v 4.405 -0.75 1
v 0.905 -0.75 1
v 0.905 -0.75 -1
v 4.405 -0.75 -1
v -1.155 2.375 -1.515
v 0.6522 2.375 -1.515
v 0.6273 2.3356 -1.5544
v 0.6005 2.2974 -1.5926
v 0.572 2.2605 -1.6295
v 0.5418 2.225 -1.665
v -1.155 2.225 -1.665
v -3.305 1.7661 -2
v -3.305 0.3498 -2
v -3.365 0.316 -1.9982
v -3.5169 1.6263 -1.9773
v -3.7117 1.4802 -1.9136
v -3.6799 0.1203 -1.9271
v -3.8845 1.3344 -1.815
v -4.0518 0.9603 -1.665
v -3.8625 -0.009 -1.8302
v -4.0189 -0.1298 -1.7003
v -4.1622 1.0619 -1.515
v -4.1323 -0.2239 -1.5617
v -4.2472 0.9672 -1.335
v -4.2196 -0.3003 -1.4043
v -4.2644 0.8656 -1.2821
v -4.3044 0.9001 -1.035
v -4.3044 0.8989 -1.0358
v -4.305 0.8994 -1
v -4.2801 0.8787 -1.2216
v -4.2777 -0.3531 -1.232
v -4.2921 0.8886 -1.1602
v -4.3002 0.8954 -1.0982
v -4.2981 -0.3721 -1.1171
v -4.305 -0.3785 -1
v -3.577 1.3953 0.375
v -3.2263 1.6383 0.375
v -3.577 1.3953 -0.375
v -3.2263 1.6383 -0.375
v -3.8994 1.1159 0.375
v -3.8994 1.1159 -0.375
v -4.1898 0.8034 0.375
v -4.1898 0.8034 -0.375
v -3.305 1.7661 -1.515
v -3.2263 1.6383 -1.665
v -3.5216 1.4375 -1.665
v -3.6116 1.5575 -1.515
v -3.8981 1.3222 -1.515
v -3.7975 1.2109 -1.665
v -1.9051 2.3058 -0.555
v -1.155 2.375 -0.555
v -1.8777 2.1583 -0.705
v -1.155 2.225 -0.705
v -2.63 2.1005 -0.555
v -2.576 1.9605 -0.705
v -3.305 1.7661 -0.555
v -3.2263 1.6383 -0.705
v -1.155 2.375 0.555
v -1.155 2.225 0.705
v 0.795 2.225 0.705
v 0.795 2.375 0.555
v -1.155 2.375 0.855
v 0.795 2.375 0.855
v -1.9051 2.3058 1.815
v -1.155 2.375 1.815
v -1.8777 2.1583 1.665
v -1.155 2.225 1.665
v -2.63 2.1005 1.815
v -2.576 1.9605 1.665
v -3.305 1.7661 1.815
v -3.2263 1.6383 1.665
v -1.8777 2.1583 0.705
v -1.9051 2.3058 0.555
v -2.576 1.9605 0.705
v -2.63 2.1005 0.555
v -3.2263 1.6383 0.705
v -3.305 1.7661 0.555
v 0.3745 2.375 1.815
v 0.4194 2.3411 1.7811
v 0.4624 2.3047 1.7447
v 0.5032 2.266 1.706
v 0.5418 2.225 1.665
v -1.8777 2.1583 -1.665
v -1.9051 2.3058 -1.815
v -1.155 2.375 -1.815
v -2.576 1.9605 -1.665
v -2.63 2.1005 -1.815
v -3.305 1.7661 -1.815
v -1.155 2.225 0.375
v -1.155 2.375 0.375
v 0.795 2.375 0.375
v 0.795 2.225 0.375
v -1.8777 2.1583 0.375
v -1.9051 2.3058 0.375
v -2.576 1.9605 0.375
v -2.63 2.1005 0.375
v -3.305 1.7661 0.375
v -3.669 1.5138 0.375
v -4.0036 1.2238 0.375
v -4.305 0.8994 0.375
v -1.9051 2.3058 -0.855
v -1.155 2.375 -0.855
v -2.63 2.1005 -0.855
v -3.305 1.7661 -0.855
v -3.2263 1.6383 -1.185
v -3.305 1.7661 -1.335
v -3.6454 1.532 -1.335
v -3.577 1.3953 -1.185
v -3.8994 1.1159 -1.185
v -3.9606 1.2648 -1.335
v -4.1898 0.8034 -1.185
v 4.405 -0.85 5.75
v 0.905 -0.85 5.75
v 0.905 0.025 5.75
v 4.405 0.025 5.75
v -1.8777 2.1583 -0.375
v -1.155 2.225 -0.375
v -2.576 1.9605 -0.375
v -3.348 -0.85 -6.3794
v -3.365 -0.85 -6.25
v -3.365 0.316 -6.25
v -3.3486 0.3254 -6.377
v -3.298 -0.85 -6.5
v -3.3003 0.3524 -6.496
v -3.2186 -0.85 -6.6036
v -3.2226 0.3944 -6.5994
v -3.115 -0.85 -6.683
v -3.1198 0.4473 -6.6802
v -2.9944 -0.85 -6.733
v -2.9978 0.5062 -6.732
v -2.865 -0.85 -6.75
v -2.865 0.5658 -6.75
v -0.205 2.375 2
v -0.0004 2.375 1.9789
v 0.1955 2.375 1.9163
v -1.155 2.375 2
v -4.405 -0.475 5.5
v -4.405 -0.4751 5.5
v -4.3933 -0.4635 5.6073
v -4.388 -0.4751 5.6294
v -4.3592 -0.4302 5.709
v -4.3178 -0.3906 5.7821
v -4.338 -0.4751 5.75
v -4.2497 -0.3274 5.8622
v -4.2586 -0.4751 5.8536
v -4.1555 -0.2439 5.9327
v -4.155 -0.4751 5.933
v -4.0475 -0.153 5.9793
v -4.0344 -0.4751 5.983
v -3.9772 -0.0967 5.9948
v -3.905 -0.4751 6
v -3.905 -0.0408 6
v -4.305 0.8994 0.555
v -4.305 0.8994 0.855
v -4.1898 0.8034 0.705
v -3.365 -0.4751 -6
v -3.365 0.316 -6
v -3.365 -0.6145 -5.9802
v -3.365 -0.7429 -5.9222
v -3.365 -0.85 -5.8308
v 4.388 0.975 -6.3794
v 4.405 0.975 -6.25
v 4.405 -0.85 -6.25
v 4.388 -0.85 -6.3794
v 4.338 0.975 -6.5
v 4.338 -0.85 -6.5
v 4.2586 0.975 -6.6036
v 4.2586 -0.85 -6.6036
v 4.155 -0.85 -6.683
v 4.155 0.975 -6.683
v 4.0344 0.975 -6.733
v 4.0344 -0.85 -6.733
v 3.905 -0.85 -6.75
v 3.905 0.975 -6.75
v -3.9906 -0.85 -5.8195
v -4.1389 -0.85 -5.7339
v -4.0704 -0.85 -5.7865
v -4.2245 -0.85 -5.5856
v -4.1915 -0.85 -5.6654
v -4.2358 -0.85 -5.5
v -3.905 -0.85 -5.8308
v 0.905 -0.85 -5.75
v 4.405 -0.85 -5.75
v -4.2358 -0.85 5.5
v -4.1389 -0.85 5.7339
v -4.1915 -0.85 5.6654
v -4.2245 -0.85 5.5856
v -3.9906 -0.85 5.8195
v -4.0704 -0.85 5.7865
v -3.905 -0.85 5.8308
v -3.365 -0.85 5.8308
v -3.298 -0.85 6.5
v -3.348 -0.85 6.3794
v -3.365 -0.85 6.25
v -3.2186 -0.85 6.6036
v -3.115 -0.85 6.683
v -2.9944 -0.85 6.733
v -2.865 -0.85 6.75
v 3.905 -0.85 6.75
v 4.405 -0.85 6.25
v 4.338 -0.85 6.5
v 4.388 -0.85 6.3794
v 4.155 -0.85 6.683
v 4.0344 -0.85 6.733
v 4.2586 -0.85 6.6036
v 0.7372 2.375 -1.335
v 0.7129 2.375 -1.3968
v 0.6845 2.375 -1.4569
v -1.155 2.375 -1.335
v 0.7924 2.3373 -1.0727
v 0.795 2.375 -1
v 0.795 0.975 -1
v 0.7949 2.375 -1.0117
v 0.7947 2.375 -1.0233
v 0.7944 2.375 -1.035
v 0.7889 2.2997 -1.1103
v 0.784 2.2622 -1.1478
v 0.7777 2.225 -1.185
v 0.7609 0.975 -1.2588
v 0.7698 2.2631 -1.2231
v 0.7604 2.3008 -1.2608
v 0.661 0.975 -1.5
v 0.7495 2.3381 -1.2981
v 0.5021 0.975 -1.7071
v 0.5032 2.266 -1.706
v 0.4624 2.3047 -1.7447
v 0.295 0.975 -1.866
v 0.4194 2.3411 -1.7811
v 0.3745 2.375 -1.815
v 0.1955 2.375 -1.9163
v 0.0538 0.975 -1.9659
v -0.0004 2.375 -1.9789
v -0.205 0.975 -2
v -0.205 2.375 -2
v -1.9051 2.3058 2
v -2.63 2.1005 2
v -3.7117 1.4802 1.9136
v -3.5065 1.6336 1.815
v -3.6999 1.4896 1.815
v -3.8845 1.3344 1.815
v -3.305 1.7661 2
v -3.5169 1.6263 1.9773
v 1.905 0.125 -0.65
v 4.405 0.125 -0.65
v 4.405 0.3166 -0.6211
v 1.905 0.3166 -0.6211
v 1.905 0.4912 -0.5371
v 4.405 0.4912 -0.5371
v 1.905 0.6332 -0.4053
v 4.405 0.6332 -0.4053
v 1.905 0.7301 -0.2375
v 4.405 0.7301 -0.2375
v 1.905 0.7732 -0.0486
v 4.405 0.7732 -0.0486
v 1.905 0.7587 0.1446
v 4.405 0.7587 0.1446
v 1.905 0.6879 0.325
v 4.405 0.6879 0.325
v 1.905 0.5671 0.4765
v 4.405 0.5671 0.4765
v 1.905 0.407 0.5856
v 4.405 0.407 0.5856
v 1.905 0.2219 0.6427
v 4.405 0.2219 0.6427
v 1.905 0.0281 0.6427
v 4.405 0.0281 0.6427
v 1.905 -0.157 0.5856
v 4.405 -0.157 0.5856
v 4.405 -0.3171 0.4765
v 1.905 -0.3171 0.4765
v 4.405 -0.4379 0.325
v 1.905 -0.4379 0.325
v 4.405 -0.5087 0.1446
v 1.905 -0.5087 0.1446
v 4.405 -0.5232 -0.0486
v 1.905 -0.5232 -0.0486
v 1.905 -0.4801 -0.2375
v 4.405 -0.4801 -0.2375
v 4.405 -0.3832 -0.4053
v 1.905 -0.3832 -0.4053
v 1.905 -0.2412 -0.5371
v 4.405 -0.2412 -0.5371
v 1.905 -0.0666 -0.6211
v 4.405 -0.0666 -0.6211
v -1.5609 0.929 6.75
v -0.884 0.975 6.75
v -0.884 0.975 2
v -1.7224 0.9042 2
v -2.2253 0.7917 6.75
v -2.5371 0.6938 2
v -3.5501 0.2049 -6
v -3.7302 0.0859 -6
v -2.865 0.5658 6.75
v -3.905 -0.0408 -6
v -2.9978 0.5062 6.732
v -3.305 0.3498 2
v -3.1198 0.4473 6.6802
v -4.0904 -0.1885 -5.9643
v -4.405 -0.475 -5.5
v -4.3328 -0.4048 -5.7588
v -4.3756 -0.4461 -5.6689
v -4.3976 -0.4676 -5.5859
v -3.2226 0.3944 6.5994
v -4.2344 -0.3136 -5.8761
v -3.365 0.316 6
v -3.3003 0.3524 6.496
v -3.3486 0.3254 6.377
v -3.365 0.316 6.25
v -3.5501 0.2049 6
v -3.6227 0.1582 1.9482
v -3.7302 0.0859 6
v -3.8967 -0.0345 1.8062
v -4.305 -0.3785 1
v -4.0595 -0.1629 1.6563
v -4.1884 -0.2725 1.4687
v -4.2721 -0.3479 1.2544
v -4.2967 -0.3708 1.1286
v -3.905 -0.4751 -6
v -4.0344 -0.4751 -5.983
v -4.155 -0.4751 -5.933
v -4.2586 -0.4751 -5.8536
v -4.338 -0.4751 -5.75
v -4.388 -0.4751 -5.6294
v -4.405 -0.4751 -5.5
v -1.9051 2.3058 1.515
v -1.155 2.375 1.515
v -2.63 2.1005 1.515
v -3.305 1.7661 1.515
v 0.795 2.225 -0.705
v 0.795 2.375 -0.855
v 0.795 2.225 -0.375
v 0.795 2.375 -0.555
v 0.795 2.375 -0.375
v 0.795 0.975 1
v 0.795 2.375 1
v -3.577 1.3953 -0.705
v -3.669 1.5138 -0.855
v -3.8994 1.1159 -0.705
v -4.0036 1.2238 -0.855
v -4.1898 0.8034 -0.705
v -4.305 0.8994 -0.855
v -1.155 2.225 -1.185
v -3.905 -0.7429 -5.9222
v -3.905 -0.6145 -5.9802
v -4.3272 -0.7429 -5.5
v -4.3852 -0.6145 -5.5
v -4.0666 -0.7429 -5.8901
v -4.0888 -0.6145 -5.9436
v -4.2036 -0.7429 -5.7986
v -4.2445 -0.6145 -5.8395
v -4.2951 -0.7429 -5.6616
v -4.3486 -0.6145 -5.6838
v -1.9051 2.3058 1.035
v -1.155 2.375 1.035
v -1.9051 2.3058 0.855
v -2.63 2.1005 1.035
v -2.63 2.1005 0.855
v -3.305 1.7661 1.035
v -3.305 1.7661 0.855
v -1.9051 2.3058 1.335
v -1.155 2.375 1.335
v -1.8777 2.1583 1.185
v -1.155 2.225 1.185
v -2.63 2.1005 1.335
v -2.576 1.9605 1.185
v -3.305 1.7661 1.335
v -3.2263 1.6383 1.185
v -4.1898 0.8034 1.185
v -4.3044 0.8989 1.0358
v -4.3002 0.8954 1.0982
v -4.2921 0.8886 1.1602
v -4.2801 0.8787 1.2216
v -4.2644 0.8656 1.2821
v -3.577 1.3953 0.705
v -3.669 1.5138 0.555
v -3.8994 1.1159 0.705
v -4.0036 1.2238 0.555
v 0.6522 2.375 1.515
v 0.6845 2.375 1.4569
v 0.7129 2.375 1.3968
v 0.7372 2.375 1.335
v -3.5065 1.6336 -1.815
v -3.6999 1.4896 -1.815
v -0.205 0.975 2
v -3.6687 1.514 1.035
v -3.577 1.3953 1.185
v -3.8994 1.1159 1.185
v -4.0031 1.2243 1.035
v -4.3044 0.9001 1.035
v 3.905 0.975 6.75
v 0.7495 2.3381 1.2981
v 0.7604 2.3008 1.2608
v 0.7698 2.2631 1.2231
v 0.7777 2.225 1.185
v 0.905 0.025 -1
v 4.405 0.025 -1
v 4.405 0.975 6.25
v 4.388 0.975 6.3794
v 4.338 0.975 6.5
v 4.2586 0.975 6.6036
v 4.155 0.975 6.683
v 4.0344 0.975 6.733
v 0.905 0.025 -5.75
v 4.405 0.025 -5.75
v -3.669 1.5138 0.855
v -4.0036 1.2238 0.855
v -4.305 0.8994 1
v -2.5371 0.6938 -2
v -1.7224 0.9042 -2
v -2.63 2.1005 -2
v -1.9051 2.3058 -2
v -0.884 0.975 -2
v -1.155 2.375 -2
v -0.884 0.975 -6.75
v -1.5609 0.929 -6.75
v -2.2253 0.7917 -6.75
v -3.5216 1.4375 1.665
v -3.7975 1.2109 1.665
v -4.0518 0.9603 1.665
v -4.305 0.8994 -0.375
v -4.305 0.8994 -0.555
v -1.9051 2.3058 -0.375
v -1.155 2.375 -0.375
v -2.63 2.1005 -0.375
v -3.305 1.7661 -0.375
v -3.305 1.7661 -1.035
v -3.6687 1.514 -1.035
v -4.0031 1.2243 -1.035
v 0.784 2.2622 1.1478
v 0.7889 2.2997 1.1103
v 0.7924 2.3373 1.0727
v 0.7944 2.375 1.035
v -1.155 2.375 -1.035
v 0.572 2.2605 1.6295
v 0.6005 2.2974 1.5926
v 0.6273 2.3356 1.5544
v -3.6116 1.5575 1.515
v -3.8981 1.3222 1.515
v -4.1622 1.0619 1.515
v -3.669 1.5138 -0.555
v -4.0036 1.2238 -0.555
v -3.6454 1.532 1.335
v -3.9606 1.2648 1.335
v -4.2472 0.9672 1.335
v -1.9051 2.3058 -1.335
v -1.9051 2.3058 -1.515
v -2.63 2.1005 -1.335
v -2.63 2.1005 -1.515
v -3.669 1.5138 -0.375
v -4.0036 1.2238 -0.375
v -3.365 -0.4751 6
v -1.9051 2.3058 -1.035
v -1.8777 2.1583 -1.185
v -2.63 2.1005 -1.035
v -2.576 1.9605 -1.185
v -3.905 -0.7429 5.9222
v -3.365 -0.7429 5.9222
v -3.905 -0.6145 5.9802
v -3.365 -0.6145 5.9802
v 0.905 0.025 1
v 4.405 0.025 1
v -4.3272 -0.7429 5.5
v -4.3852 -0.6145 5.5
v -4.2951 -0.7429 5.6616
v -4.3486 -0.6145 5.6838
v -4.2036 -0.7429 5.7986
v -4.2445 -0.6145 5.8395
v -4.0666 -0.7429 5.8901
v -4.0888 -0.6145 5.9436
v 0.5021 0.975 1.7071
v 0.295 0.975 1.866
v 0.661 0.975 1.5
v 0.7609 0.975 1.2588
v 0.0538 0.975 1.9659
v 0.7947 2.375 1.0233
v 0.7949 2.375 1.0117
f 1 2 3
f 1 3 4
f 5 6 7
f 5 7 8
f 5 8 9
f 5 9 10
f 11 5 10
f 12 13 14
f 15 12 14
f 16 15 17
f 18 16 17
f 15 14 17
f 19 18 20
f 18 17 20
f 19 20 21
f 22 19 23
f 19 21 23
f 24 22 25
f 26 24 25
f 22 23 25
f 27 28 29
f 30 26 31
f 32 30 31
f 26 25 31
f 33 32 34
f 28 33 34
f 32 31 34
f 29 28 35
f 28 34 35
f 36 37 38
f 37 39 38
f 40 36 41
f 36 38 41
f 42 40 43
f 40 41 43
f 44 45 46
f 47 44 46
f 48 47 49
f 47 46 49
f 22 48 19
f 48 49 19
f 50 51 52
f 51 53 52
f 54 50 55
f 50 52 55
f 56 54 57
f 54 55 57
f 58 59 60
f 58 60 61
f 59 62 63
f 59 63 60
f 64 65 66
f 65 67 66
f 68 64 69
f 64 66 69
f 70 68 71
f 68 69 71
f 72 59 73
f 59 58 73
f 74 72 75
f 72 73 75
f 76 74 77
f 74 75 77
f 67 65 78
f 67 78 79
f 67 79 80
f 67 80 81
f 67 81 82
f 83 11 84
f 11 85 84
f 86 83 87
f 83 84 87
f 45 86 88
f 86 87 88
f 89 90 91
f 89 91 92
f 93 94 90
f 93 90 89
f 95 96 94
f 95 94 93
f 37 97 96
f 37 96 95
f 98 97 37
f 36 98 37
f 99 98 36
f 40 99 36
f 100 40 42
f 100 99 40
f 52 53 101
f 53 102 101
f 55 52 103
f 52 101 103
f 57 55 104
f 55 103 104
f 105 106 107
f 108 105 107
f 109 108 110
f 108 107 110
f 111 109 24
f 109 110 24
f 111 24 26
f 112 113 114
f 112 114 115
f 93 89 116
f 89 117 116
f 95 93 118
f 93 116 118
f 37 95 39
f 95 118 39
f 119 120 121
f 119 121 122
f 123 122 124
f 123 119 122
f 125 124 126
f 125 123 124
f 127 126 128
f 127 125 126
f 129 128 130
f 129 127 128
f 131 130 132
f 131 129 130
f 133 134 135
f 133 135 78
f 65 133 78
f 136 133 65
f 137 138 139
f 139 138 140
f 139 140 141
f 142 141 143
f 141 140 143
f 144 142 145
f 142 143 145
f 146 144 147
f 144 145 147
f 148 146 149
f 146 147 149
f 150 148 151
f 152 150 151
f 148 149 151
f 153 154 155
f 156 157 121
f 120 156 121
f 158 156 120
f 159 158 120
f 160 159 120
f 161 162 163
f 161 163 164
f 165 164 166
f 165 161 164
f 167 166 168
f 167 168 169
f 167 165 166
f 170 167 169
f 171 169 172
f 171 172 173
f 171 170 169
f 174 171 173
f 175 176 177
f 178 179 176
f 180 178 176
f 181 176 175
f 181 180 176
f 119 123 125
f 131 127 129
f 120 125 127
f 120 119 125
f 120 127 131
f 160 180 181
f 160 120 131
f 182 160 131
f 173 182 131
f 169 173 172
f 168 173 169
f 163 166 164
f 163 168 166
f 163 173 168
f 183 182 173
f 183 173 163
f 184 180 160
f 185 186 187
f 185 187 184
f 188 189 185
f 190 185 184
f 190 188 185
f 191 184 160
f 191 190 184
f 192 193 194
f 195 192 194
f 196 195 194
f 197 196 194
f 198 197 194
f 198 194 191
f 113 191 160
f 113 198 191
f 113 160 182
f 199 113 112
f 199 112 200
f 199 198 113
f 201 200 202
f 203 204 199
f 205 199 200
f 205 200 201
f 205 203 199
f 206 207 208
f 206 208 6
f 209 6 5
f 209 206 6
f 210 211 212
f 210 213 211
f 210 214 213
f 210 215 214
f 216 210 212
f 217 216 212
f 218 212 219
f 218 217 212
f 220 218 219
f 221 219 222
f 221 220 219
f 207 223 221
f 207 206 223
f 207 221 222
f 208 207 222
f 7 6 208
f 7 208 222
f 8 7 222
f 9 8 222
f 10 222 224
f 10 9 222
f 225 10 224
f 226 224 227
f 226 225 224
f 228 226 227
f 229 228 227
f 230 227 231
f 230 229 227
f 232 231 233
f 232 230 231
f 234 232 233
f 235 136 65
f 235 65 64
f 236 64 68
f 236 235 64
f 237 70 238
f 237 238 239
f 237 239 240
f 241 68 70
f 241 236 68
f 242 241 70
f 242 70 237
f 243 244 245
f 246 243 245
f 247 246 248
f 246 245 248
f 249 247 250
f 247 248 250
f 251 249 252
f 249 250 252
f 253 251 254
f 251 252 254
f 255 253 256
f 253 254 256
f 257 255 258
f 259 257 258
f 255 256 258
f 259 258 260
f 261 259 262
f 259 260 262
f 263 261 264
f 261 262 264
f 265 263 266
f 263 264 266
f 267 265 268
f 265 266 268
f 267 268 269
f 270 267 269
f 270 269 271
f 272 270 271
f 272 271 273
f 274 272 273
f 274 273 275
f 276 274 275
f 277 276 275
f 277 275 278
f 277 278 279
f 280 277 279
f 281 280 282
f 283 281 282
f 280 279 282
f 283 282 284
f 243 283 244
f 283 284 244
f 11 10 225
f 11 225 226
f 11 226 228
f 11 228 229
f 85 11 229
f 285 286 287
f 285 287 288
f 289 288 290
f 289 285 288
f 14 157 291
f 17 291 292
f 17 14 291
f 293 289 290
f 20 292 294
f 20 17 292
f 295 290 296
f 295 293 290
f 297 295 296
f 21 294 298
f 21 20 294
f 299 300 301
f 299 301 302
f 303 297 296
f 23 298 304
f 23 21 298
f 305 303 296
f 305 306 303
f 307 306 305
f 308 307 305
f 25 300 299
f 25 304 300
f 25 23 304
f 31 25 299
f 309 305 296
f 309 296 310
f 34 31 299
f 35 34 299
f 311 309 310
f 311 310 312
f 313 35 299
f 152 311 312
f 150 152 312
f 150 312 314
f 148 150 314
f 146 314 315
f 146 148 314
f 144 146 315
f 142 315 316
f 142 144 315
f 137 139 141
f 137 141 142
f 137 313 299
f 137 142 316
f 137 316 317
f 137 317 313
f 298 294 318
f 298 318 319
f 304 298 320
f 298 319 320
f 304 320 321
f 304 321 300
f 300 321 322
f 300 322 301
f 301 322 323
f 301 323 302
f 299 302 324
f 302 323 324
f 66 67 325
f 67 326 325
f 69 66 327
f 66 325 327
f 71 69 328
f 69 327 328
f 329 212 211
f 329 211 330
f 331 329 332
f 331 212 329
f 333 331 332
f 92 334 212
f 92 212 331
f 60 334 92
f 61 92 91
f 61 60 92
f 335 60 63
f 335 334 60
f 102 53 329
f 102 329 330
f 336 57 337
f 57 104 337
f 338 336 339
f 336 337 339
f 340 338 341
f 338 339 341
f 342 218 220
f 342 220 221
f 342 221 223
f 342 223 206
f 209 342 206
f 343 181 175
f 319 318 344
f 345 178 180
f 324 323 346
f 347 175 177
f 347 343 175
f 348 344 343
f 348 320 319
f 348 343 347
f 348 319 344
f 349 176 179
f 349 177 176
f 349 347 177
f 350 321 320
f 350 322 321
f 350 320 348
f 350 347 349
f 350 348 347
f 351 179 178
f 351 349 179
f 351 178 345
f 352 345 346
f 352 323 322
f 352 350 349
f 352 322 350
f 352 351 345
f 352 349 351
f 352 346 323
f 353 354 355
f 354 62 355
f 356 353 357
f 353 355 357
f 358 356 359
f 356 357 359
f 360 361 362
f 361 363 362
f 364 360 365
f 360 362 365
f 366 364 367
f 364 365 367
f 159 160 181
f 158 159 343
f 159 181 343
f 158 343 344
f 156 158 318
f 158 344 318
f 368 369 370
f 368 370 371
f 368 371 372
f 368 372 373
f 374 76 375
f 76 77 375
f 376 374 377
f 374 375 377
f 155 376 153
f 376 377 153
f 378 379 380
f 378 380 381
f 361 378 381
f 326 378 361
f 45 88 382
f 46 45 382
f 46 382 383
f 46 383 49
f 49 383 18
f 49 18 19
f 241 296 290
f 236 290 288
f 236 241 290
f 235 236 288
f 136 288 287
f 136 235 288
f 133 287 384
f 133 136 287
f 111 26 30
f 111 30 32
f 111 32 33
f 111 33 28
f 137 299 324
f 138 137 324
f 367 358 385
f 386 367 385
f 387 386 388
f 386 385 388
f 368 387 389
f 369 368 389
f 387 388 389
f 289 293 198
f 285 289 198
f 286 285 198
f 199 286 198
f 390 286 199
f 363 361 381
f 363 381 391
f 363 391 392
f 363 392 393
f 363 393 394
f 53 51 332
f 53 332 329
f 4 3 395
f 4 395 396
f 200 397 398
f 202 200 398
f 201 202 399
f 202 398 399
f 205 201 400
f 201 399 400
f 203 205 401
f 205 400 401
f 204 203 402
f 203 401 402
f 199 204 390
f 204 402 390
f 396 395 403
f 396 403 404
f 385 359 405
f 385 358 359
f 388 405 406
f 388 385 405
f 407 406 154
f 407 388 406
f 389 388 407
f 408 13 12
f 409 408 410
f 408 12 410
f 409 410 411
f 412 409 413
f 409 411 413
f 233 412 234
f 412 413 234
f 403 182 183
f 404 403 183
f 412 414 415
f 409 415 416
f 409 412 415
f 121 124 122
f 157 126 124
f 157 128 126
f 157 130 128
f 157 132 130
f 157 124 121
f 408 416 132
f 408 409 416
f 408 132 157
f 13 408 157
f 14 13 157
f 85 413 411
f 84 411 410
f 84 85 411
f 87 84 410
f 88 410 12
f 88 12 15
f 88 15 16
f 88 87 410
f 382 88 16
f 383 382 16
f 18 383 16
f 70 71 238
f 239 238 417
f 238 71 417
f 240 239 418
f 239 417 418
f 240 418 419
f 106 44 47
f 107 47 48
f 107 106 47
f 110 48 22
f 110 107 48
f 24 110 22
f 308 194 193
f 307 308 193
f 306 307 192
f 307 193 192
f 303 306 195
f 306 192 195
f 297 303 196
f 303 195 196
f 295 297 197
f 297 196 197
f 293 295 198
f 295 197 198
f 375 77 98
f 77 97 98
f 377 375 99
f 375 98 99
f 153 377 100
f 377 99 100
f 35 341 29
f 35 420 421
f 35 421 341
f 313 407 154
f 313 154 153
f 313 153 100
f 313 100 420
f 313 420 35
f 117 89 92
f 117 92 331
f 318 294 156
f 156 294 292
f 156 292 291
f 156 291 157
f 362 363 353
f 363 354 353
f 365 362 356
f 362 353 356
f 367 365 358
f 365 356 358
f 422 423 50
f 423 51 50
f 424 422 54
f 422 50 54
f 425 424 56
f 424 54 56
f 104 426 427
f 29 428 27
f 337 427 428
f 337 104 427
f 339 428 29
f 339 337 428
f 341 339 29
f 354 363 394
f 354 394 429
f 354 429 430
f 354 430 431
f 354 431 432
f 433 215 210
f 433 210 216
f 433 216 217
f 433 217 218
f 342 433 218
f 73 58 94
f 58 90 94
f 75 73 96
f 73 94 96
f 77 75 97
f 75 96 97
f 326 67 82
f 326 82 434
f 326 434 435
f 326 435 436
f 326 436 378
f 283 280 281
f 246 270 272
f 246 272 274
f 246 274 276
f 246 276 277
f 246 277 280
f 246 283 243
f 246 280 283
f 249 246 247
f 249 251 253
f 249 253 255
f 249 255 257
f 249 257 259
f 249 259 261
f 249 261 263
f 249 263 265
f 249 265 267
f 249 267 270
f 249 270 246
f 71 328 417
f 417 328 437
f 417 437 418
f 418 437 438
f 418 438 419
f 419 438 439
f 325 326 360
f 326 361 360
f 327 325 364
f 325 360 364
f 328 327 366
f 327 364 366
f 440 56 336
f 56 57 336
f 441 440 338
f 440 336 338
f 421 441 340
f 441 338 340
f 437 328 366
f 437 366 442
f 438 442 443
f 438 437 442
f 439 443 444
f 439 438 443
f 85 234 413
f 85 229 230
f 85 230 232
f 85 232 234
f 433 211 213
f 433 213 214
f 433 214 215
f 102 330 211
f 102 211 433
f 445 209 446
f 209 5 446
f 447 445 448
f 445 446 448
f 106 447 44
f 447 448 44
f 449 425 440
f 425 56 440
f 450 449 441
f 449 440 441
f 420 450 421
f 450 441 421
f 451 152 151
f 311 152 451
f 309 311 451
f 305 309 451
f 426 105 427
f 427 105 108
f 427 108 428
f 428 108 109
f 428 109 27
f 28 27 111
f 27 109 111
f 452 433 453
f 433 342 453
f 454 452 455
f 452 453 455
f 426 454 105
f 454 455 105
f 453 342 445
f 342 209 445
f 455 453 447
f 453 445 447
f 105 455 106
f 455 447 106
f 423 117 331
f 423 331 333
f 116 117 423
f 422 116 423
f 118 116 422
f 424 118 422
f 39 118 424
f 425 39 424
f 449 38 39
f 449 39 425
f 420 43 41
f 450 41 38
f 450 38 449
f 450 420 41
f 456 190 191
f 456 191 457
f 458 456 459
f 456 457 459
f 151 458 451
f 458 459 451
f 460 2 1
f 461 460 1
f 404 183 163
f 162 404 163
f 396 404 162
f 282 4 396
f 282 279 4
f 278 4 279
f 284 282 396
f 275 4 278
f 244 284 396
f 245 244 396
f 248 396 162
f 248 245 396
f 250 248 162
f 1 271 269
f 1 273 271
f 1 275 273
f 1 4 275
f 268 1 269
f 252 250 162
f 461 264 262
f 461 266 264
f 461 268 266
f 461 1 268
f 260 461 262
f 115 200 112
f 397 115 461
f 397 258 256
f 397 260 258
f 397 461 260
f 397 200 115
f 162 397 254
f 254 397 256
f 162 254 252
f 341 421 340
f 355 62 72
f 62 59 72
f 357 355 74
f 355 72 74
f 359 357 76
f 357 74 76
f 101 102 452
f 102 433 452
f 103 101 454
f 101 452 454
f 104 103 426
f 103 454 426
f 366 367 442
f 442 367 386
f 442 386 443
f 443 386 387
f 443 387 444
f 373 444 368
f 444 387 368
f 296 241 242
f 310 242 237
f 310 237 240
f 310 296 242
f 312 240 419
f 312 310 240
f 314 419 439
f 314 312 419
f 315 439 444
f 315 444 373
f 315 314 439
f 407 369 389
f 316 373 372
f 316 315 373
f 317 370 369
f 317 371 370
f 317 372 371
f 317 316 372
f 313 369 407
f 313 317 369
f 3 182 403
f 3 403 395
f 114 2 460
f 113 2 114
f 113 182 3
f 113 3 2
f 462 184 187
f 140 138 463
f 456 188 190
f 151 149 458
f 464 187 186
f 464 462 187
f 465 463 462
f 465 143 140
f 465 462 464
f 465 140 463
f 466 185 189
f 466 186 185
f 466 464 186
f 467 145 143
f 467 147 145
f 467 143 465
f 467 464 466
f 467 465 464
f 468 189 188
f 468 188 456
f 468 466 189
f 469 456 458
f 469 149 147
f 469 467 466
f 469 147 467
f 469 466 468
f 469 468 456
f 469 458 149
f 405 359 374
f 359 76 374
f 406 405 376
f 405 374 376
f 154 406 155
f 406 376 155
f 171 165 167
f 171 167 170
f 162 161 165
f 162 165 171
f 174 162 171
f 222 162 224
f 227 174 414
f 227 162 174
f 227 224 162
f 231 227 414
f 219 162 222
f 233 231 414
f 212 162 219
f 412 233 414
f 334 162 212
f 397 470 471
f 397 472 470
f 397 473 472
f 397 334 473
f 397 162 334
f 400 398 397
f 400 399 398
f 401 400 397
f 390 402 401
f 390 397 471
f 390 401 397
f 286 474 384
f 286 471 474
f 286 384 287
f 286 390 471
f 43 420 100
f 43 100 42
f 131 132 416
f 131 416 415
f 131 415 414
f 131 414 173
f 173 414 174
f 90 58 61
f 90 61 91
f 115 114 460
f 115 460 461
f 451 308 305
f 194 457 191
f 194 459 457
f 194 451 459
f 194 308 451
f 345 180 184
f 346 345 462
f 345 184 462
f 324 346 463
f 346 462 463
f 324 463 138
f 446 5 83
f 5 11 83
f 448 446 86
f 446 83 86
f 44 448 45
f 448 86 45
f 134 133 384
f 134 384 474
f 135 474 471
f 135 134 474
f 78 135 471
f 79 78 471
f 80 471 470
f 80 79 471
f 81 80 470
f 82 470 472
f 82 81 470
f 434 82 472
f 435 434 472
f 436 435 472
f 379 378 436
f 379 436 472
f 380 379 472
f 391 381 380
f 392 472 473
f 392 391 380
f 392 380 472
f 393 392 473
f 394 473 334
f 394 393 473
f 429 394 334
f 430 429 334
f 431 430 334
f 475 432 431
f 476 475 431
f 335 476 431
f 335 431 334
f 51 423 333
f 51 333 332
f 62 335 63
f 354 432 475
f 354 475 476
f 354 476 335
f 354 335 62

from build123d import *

# Parameters (mm, degrees)
BOSS_EXTRUDE1_DEPTH = 6
BOSS_EXTRUDE2_DEPTH = 2
FILLET1_R           = 1
BOSS_EXTRUDE3_DEPTH = 6.75
FILLET2_R           = 0.5
SKETCH6_R           = 0.65
CUT_EXTRUDE1_DEPTH  = 2.5
FILLET3_R           = 0.5
SKETCH8_W           = 3.5
SKETCH8_H           = 4.75
CUT_EXTRUDE2_DEPTH  = 1
SKETCH9_W           = 8.81
SKETCH9_H           = 0.125
CUT_EXTRUDE3_DEPTH  = 15.397730865
SKETCH10_W          = 3.5
SKETCH10_H          = 2
CUT_EXTRUDE4_DEPTH  = 0.1


with BuildPart() as part:
    # Sketch2 → Boss-Extrude1 (new, symmetric)
    with BuildSketch(Plane.XY):
        with BuildLine():
            Line((4.405, 0.975), (-0.883991622, 0.975))
            ThreePointArc((-0.883991622, 0.975), (-2.787934898, 0.598310502), (-4.405, -0.475))
            Line((-4.405, -0.475), (-4.405, -0.975))
            Line((-4.405, -0.975), (4.405, -0.975))
            Line((4.405, -0.975), (4.405, 0.975))
        make_face()
    extrude(amount=BOSS_EXTRUDE1_DEPTH, both=True)

    # Sketch3 → Boss-Extrude2 (add, symmetric)
    with BuildSketch(Plane.XY):
        with BuildLine():
            ThreePointArc((-1.155, 2.375), (-2.894244197, 1.987819633), (-4.305, 0.899404694))
            Line((-4.305, 0.899404694), (-4.305, -0.37853573))
            ThreePointArc((-4.305, -0.37853573), (-2.723513115, 0.624318302), (-0.883991622, 0.975))
            Line((-0.883991622, 0.975), (0.795, 0.975))
            Line((0.795, 0.975), (0.795, 2.375))
            Line((0.795, 2.375), (-1.155, 2.375))
        make_face()
    extrude(amount=BOSS_EXTRUDE2_DEPTH, both=True)

    # Fillet1
    fillet1_edges = [part.edges().sort_by_distance(p)[0] for p in [
        (0.795, 1.675, -2),
        (-4.305, 0.260434482, -2),
        (0.795, 1.675, 2),
        (-4.305, 0.260434482, 2),
    ]]
    fillet(fillet1_edges, radius=FILLET1_R)

    # Cut-Sweep1: sweep along a path in Sketch4
    with BuildLine(Plane.XY.offset(2)) as cut_sweep1_path:
        Line((0.795, 2.375), (-0.205, 2.375))
        Line((-0.205, 2.375), (-1.155, 2.375))
        ThreePointArc((-1.155, 2.375), (-2.27228554, 2.219828643), (-3.305, 1.766060011))
        ThreePointArc((-3.305, 1.766060011), (-3.840195125, 1.373342644), (-4.305, 0.899404694))
    # Sketch5 → Cut-Sweep1 (sweep, cut)
    with BuildSketch(Plane(origin=(0.795, 0, 0), x_dir=(0, 0, -1), z_dir=(1, 0, 0))):
        Polygon((-1.815, 2.375), (-1.665, 2.225), (-1.515, 2.375), (-1.335, 2.375), (-1.185, 2.225), (-1.035, 2.375), (-0.855, 2.375), (-0.705, 2.225), (-0.555, 2.375), (-0.375, 2.375), (-0.375, 2.225), (0.375, 2.225), (0.375, 2.375), (0.555, 2.375), (0.705, 2.225), (0.855, 2.375), (1.035, 2.375), (1.185, 2.225), (1.335, 2.375), (1.515, 2.375), (1.665, 2.225), (1.815, 2.375), (1.815, 2.475), (-1.815, 2.475), align=None)
    sweep(path=cut_sweep1_path.line, mode=Mode.SUBTRACT)

    # Sketch7 → Boss-Extrude3 (add, symmetric)
    with BuildSketch(Plane.XY):
        with BuildLine():
            Line((4.405, -0.975), (4.405, 0.975))
            Line((4.405, 0.975), (-0.883991622, 0.975))
            ThreePointArc((-0.883991622, 0.975), (-2.167505893, 0.807451874), (-3.365, 0.316036446))
            Line((-3.365, 0.316036446), (-3.365, -0.975))
            Line((-3.365, -0.975), (4.405, -0.975))
        make_face()
    extrude(amount=BOSS_EXTRUDE3_DEPTH, both=True)

    # Fillet2
    fillet2_edges = [part.edges().sort_by_distance(p)[0] for p in [
        (-4.405, -0.725, 6),
        (4.405, 0, -6.75),
        (-3.365, -0.329481777, -6.75),
        (4.405, 0, 6.75),
        (-3.365, -0.329481777, 6.75),
        (-4.405, -0.725, -6),
    ]]
    fillet(fillet2_edges, radius=FILLET2_R)

    # Sketch6 → Cut-Extrude1 (cut)
    with BuildSketch(Plane(origin=(4.405, 0, 0), x_dir=(0, 0, -1), z_dir=(1, 0, 0))):
        with Locations((0, 0.125)):
            Circle(SKETCH6_R)
    extrude(amount=-CUT_EXTRUDE1_DEPTH, mode=Mode.SUBTRACT)

    # Fillet3
    fillet3_edges = [part.edges().sort_by_distance(p)[0] for p in [
        (-3.635, -0.975, 6),
        (-4.258553391, -0.975, 5.853553391),
        (-3.635, -0.975, -6),
        (-4.258553391, -0.975, -5.853553391),
        (-4.405, -0.975, 0),
    ]]
    fillet(fillet3_edges, radius=FILLET3_R - 0.0001)  # a hair under: the kernel refuses the full size

    # Sketch8 → Cut-Extrude2 (cut)
    with BuildSketch(Plane.XZ.offset(0.975)):
        with Locations((2.655, -3.375)):
            Rectangle(SKETCH8_W, SKETCH8_H)
        with Locations((2.655, 3.375)):
            Rectangle(SKETCH8_W, SKETCH8_H)
    extrude(amount=-CUT_EXTRUDE2_DEPTH, mode=Mode.SUBTRACT)

    # Sketch9 → Cut-Extrude3 (cut, through all)
    with BuildSketch(Plane.XY.offset(6.75)):
        with Locations((0, -0.9125)):
            Rectangle(SKETCH9_W, SKETCH9_H)
    extrude(amount=-CUT_EXTRUDE3_DEPTH, mode=Mode.SUBTRACT)

    # Sketch10 → Cut-Extrude4 (cut)
    with BuildSketch(Plane.XZ.offset(0.85)):
        with Locations((2.655, 0)):
            Rectangle(SKETCH10_W, SKETCH10_H)
    extrude(amount=-CUT_EXTRUDE4_DEPTH, mode=Mode.SUBTRACT)


solid = part.part
